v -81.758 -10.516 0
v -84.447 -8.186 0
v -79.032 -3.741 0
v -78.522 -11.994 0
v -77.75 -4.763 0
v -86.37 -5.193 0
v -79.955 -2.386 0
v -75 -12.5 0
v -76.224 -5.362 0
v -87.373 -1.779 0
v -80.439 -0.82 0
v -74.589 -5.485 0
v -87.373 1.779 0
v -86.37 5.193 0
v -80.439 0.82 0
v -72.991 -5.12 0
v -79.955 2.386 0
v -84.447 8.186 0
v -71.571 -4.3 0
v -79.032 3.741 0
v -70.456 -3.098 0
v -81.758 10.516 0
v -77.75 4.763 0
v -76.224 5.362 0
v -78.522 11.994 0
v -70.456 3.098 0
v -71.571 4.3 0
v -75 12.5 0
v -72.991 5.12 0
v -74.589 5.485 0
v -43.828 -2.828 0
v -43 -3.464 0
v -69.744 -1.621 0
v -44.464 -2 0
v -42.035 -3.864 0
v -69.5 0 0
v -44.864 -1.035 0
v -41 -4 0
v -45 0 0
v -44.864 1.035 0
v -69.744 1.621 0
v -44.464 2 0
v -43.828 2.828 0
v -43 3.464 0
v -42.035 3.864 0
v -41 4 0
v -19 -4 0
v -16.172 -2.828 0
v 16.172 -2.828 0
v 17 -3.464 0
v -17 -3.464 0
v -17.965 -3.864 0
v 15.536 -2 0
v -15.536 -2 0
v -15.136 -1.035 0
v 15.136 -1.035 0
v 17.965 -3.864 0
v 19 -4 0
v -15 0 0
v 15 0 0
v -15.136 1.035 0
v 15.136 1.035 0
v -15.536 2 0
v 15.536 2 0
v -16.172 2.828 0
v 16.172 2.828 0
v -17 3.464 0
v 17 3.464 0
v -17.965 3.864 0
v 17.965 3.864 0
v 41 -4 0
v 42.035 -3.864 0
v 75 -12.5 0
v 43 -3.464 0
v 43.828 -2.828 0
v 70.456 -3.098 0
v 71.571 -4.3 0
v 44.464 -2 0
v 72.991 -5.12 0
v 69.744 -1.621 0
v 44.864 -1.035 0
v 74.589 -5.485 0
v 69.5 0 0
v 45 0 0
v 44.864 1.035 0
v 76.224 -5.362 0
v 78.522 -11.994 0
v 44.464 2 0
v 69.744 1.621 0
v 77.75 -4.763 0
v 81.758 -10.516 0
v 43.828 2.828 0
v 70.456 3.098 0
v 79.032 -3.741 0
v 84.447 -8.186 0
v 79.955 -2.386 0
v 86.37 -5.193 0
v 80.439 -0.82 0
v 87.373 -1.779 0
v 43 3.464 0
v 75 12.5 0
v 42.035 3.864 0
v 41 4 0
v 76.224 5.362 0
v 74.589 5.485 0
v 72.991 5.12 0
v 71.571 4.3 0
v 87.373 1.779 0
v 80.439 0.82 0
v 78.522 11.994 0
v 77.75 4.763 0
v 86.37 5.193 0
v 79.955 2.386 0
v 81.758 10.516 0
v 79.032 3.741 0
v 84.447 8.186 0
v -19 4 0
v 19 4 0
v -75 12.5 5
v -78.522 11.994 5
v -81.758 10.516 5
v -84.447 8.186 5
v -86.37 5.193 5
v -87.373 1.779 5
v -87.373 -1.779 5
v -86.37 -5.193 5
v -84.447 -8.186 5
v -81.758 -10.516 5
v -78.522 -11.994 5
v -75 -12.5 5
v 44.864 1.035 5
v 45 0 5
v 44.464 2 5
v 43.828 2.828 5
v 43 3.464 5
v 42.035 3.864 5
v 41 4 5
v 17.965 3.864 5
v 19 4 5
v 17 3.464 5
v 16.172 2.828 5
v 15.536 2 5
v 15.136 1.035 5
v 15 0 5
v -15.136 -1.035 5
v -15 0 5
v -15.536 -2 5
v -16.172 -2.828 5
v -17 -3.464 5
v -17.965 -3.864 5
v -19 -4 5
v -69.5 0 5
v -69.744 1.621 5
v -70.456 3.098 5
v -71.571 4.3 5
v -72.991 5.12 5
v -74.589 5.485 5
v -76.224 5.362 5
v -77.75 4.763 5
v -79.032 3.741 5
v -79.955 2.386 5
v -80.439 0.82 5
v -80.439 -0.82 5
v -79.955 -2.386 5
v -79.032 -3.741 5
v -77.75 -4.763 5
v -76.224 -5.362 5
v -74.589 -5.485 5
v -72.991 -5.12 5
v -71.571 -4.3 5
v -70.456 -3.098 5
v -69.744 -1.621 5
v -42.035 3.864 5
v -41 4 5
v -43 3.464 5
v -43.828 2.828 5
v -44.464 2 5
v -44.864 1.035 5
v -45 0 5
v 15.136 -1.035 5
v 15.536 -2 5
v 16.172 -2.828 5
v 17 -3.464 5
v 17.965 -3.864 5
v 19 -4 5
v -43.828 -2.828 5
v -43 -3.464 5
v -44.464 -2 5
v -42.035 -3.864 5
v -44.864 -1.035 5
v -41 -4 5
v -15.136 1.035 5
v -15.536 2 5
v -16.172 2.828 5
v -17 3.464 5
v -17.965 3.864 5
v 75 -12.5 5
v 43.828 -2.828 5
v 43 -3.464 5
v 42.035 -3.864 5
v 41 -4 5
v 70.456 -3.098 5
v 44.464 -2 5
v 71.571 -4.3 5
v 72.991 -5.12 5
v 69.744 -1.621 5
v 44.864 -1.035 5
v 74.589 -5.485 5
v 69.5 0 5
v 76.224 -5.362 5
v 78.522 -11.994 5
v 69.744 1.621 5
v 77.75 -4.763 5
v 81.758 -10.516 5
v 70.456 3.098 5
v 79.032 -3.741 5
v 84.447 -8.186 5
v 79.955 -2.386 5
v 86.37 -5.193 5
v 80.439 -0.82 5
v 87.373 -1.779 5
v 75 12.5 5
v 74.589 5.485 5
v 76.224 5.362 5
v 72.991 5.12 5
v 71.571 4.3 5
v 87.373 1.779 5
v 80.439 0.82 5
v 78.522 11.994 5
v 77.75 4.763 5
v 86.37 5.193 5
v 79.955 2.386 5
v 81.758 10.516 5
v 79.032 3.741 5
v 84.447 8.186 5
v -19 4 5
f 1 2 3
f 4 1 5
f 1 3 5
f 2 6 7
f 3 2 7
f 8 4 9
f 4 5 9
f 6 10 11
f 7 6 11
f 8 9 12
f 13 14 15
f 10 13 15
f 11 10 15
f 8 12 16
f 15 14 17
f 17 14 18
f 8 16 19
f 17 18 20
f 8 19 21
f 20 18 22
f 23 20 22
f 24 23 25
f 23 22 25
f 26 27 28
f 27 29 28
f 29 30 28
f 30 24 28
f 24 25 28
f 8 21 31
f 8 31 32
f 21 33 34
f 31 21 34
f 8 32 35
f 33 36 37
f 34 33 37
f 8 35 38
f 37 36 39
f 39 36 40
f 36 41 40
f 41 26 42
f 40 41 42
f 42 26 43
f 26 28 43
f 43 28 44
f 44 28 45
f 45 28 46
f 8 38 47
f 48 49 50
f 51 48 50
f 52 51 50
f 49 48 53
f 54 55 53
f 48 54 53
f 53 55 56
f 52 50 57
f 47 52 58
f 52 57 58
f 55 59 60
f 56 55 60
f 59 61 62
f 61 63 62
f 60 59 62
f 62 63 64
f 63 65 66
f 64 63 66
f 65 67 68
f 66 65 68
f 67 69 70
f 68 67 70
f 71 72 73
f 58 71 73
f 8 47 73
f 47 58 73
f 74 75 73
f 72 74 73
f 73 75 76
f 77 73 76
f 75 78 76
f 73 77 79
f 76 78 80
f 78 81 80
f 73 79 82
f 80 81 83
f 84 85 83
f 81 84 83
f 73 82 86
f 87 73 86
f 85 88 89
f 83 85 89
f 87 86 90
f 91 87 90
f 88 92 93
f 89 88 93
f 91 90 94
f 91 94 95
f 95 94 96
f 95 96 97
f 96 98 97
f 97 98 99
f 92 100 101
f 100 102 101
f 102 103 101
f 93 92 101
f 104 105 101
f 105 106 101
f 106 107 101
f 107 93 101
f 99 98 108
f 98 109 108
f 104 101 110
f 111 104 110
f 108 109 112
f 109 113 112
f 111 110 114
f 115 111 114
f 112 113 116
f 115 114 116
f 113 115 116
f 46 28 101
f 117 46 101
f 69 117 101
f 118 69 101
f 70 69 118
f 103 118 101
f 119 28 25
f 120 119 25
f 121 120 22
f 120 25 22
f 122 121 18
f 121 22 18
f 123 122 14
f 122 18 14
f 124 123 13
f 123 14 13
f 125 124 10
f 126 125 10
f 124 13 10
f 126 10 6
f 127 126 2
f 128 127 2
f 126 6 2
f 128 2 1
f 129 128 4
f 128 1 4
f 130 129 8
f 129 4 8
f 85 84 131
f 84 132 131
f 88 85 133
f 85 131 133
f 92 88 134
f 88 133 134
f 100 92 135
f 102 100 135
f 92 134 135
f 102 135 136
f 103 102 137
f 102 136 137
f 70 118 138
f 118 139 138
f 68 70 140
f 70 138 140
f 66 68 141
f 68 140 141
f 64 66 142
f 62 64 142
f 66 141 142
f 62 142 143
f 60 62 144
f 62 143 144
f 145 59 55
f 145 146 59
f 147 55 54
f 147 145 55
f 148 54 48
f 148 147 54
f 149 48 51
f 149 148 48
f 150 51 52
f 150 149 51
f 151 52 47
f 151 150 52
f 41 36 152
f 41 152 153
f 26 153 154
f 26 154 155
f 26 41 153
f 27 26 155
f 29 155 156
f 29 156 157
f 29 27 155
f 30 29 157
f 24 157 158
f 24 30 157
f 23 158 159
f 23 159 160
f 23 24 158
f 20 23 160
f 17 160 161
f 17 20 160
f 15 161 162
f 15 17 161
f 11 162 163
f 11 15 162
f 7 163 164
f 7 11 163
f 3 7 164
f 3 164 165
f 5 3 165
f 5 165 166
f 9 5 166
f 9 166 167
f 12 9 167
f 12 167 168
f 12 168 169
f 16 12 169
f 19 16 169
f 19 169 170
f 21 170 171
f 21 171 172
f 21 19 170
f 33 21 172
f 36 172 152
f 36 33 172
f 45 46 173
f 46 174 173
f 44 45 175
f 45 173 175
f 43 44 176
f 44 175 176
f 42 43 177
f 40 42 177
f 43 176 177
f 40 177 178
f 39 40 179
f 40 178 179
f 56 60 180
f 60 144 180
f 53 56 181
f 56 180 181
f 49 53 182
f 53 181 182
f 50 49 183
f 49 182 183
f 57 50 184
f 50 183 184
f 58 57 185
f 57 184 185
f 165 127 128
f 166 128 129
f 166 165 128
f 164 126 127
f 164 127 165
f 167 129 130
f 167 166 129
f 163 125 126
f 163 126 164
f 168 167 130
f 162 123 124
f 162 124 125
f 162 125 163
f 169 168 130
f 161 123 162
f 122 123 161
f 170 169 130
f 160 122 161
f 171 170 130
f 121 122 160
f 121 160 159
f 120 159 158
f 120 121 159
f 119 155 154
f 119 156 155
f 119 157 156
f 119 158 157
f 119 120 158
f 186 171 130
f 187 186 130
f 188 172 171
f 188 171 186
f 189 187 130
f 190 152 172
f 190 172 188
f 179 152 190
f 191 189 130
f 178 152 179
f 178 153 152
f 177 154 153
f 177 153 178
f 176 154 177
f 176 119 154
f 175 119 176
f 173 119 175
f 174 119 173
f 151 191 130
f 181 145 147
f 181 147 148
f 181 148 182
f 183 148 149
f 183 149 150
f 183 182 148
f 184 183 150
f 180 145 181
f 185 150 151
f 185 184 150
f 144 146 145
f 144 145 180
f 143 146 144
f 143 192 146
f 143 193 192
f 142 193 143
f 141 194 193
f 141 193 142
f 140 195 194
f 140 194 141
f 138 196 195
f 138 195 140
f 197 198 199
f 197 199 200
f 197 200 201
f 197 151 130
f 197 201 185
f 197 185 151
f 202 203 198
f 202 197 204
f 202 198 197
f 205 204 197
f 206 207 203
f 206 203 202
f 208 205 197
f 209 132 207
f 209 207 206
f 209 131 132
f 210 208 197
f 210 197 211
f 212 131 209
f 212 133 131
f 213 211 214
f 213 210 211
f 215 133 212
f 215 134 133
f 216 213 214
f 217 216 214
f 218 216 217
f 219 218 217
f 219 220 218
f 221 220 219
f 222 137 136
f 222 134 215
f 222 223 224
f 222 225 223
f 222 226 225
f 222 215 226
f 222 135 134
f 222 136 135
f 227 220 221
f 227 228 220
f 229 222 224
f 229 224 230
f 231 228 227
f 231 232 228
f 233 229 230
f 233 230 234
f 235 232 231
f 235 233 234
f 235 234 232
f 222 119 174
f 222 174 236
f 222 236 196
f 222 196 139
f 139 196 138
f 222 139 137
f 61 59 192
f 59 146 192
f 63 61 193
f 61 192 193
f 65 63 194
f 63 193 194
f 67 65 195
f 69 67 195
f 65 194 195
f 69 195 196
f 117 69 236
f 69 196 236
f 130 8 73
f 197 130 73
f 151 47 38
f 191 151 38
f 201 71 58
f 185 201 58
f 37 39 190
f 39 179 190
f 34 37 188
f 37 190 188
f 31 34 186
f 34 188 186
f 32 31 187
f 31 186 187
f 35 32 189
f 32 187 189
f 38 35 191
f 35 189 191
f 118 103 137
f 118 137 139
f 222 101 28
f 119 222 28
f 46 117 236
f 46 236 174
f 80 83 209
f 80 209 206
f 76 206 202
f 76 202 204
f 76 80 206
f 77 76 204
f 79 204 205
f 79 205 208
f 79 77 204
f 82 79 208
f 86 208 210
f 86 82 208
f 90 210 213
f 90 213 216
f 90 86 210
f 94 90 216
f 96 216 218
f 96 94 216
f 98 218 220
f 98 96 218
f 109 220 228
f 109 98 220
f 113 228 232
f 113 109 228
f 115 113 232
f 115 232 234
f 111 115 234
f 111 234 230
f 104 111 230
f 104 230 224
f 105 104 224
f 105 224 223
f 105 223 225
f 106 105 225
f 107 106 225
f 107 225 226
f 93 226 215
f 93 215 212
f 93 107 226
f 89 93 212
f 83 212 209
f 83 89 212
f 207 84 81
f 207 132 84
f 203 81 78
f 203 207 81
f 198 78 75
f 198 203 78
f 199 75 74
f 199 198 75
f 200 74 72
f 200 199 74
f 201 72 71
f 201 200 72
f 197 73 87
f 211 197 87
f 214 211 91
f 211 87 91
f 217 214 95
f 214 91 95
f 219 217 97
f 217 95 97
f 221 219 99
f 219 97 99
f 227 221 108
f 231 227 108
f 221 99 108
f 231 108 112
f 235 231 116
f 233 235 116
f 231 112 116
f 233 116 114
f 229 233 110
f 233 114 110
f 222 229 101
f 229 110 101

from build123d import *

# Parameters (mm, degrees)
SKETCH1_R           = 5.5
BOSS_EXTRUDE1_DEPTH = 5
SKETCH2_W           = 30
SKETCH2_H           = 8
CUT_EXTRUDE1_DEPTH  = 10
FILLET1_R           = 4


with BuildPart() as part:
    # Sketch1 → Boss-Extrude1 (new body)
    with BuildSketch(Plane.XY):
        with BuildLine():
            Line((75, 12.5), (-75, 12.5))
            ThreePointArc((-75, 12.5), (-87.5, 0), (-75, -12.5))
            Line((-75, -12.5), (75, -12.5))
            ThreePointArc((75, -12.5), (87.5, 0), (75, 12.5))
        make_face()
        with Locations((-75, 0)):
            Circle(SKETCH1_R, mode=Mode.SUBTRACT)
        with Locations(Location((75, 0, 0), (0, 0, 180))):
            Circle(SKETCH1_R, mode=Mode.SUBTRACT)
    extrude(amount=BOSS_EXTRUDE1_DEPTH)

    # Sketch2 → Cut-Extrude1 (cut)
    with BuildSketch(Plane(origin=(0, 0, 0), x_dir=(-1, 0, 0), z_dir=(0, 0, -1))):
        with Locations((-30, 0)):
            Rectangle(SKETCH2_W, SKETCH2_H)
        with Locations((30, 0)):
            Rectangle(SKETCH2_W, SKETCH2_H)
    extrude(amount=-CUT_EXTRUDE1_DEPTH, mode=Mode.SUBTRACT)

    # Fillet1
    fillet1_edges = [part.edges().sort_by_distance(p)[0] for p in [
        (15, -4, 2.5),
        (45, -4, 2.5),
        (45, 4, 2.5),
        (15, 4, 2.5),
        (-45, -4, 2.5),
        (-15, -4, 2.5),
        (-15, 4, 2.5),
        (-45, 4, 2.5),
    ]]
    fillet(fillet1_edges, radius=FILLET1_R - 0.0001)  # a hair under: the kernel refuses the full size


solid = part.part
